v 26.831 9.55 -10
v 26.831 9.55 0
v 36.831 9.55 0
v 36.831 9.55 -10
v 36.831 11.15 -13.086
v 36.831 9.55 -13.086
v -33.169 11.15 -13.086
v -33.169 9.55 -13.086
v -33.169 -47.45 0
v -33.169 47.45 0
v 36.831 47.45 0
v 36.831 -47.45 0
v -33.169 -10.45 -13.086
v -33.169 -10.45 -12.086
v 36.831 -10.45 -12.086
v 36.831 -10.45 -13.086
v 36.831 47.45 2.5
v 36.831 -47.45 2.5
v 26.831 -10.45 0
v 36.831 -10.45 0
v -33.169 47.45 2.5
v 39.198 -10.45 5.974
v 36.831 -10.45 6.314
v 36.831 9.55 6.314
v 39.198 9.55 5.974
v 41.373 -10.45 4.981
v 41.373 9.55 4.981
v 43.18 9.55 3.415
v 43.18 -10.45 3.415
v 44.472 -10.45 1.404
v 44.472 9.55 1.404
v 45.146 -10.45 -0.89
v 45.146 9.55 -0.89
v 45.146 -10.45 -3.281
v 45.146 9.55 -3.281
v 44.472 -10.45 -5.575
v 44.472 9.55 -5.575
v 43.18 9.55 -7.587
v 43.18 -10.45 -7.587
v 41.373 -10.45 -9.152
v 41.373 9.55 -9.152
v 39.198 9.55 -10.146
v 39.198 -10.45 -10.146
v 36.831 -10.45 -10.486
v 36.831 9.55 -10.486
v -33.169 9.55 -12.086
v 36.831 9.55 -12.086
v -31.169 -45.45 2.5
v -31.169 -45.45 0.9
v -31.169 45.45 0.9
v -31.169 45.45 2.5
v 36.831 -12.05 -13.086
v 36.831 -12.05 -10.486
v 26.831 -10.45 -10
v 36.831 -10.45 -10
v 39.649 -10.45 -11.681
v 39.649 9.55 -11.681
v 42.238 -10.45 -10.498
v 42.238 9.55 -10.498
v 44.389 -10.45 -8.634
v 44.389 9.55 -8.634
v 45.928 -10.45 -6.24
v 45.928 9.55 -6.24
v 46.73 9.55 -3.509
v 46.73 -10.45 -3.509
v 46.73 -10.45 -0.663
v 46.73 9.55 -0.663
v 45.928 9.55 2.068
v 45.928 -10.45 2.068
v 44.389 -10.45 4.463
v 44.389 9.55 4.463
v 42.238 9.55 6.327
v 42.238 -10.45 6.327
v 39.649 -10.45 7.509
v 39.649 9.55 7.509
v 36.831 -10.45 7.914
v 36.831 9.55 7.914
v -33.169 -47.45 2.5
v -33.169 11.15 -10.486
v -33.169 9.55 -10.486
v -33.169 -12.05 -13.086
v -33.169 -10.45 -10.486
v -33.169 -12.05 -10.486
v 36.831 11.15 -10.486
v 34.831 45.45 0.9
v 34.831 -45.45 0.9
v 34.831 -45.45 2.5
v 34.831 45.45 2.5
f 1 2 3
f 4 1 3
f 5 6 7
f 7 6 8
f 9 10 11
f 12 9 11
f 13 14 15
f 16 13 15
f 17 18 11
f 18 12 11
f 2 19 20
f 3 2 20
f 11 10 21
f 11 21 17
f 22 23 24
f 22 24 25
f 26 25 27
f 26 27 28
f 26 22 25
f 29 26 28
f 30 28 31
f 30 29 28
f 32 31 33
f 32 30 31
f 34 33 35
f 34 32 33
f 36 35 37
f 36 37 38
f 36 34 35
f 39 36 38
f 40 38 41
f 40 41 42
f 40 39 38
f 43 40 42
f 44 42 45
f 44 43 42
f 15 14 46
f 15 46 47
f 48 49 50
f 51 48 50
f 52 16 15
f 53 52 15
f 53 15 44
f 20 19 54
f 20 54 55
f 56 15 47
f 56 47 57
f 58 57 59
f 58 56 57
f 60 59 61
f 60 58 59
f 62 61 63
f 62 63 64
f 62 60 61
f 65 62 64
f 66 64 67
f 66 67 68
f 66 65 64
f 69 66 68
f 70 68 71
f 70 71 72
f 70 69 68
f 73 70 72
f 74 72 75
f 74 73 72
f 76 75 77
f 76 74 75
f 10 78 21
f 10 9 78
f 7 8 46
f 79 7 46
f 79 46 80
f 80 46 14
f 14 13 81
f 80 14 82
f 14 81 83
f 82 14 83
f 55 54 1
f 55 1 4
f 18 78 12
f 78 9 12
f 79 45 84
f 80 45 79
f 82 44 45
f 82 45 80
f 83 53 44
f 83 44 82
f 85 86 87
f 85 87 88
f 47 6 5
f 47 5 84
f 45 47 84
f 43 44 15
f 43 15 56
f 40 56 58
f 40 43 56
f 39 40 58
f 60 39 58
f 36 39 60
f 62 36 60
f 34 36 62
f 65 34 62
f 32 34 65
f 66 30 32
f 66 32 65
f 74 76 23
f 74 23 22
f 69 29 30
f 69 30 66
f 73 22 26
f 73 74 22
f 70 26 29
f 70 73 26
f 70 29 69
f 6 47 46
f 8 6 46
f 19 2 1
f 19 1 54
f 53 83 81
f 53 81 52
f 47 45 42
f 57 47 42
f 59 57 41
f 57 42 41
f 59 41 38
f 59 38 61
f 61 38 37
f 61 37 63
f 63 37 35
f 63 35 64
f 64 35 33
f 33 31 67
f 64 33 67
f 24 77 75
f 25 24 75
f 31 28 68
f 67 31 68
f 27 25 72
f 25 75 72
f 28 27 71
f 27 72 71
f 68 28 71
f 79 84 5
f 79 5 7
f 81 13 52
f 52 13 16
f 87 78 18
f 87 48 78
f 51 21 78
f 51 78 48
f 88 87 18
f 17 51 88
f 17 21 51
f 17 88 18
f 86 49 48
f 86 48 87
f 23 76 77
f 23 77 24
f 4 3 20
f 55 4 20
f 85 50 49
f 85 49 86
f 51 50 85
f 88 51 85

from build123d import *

# Parameters (mm, degrees)
F0_W      = 69.9999971151
F0_H      = 94.8999971151
F0_W_2    = 66
F0_H_2    = 90.9
F1_DEPTH  = 0.9
F2_W      = 69.9999971151
F2_H      = 94.8999971151
F2_W_2    = 65.9999964595
F2_H_2    = 90.8999964595
F3_DEPTH  = 1.6
F4_W      = 10
F4_H      = 20
F5_DEPTH  = 10
F6_W      = 70
F6_H      = 1.5999990573
F7_DEPTH  = 20
F8_W      = 70
F8_H      = 2.6
F9_DEPTH  = 1.6
F10_W     = 70
F10_H     = 2.6
F11_DEPTH = 1.6


with BuildPart() as f1:
    # F0 (on Top) → F1 (new body)
    with BuildSketch(Plane.XY):
        with Locations((1.8313949695, 0)):
            Rectangle(F0_W, F0_H)
        with Locations((1.8313949695, 0)):
            Rectangle(F0_W_2, F0_H_2, mode=Mode.SUBTRACT)
        with Locations((1.8313949695, 0)):
            Rectangle(F0_W_2, F0_H_2)
    extrude(amount=F1_DEPTH)

    # F2 (on face) → F3 (join)
    with BuildSketch(Plane.XY.offset(0.9)):
        with Locations((1.8313949695, 0)):
            Rectangle(F2_W, F2_H)
        with Locations((1.8313949695, 0)):
            Rectangle(F2_W_2, F2_H_2, mode=Mode.SUBTRACT)
    extrude(amount=F3_DEPTH)


with BuildPart() as f5:
    # F4 (on face) → F5 (new body)
    with BuildSketch(Plane(origin=(0, 0, 0), x_dir=(1, 0, 0), z_dir=(0, 0, -1))):
        with Locations((31.8313935271, 0.4499985576)):
            Rectangle(F4_W, F4_H)
    extrude(amount=F5_DEPTH)


with BuildPart() as f7:
    # F6 (on face) → F7 (new body)
    with BuildSketch(Plane.XZ.offset(10.4499985576)):
        with Locations((1.8313935271, -11.2858397096)):
            Rectangle(F6_W, F6_H)
        with BuildLine():
            Line((36.8313935271, -10.4858401809), (36.8313935271, -12.0858392382))
            ThreePointArc((36.8313935271, -12.0858392382), (46.8313935271, -2.0858392382), (36.8313935271, 7.9141607618))
            Line((36.8313935271, 7.9141607618), (36.8313935271, 6.3141617044))
            ThreePointArc((36.8313935271, 6.3141617044), (45.2313944697, -2.0858392382), (36.8313935271, -10.4858401809))
        make_face()
    extrude(amount=-F7_DEPTH)

    # F8 (on face) → F9 (join)
    with BuildSketch(Plane.XZ.offset(10.4499985576)):
        with Locations((1.8313935271, -11.7858401809)):
            Rectangle(F8_W, F8_H)
    extrude(amount=F9_DEPTH)

    # F10 (on face) → F11 (join)
    with BuildSketch(Plane(origin=(0, 9.5500014424, 0), x_dir=(-1, 0, 0), z_dir=(0, 1, 0))):
        with Locations((-1.8313935271, -11.7858401809)):
            Rectangle(F10_W, F10_H)
    extrude(amount=F11_DEPTH)


solid = Compound([f1.part, f5.part, f7.part])
